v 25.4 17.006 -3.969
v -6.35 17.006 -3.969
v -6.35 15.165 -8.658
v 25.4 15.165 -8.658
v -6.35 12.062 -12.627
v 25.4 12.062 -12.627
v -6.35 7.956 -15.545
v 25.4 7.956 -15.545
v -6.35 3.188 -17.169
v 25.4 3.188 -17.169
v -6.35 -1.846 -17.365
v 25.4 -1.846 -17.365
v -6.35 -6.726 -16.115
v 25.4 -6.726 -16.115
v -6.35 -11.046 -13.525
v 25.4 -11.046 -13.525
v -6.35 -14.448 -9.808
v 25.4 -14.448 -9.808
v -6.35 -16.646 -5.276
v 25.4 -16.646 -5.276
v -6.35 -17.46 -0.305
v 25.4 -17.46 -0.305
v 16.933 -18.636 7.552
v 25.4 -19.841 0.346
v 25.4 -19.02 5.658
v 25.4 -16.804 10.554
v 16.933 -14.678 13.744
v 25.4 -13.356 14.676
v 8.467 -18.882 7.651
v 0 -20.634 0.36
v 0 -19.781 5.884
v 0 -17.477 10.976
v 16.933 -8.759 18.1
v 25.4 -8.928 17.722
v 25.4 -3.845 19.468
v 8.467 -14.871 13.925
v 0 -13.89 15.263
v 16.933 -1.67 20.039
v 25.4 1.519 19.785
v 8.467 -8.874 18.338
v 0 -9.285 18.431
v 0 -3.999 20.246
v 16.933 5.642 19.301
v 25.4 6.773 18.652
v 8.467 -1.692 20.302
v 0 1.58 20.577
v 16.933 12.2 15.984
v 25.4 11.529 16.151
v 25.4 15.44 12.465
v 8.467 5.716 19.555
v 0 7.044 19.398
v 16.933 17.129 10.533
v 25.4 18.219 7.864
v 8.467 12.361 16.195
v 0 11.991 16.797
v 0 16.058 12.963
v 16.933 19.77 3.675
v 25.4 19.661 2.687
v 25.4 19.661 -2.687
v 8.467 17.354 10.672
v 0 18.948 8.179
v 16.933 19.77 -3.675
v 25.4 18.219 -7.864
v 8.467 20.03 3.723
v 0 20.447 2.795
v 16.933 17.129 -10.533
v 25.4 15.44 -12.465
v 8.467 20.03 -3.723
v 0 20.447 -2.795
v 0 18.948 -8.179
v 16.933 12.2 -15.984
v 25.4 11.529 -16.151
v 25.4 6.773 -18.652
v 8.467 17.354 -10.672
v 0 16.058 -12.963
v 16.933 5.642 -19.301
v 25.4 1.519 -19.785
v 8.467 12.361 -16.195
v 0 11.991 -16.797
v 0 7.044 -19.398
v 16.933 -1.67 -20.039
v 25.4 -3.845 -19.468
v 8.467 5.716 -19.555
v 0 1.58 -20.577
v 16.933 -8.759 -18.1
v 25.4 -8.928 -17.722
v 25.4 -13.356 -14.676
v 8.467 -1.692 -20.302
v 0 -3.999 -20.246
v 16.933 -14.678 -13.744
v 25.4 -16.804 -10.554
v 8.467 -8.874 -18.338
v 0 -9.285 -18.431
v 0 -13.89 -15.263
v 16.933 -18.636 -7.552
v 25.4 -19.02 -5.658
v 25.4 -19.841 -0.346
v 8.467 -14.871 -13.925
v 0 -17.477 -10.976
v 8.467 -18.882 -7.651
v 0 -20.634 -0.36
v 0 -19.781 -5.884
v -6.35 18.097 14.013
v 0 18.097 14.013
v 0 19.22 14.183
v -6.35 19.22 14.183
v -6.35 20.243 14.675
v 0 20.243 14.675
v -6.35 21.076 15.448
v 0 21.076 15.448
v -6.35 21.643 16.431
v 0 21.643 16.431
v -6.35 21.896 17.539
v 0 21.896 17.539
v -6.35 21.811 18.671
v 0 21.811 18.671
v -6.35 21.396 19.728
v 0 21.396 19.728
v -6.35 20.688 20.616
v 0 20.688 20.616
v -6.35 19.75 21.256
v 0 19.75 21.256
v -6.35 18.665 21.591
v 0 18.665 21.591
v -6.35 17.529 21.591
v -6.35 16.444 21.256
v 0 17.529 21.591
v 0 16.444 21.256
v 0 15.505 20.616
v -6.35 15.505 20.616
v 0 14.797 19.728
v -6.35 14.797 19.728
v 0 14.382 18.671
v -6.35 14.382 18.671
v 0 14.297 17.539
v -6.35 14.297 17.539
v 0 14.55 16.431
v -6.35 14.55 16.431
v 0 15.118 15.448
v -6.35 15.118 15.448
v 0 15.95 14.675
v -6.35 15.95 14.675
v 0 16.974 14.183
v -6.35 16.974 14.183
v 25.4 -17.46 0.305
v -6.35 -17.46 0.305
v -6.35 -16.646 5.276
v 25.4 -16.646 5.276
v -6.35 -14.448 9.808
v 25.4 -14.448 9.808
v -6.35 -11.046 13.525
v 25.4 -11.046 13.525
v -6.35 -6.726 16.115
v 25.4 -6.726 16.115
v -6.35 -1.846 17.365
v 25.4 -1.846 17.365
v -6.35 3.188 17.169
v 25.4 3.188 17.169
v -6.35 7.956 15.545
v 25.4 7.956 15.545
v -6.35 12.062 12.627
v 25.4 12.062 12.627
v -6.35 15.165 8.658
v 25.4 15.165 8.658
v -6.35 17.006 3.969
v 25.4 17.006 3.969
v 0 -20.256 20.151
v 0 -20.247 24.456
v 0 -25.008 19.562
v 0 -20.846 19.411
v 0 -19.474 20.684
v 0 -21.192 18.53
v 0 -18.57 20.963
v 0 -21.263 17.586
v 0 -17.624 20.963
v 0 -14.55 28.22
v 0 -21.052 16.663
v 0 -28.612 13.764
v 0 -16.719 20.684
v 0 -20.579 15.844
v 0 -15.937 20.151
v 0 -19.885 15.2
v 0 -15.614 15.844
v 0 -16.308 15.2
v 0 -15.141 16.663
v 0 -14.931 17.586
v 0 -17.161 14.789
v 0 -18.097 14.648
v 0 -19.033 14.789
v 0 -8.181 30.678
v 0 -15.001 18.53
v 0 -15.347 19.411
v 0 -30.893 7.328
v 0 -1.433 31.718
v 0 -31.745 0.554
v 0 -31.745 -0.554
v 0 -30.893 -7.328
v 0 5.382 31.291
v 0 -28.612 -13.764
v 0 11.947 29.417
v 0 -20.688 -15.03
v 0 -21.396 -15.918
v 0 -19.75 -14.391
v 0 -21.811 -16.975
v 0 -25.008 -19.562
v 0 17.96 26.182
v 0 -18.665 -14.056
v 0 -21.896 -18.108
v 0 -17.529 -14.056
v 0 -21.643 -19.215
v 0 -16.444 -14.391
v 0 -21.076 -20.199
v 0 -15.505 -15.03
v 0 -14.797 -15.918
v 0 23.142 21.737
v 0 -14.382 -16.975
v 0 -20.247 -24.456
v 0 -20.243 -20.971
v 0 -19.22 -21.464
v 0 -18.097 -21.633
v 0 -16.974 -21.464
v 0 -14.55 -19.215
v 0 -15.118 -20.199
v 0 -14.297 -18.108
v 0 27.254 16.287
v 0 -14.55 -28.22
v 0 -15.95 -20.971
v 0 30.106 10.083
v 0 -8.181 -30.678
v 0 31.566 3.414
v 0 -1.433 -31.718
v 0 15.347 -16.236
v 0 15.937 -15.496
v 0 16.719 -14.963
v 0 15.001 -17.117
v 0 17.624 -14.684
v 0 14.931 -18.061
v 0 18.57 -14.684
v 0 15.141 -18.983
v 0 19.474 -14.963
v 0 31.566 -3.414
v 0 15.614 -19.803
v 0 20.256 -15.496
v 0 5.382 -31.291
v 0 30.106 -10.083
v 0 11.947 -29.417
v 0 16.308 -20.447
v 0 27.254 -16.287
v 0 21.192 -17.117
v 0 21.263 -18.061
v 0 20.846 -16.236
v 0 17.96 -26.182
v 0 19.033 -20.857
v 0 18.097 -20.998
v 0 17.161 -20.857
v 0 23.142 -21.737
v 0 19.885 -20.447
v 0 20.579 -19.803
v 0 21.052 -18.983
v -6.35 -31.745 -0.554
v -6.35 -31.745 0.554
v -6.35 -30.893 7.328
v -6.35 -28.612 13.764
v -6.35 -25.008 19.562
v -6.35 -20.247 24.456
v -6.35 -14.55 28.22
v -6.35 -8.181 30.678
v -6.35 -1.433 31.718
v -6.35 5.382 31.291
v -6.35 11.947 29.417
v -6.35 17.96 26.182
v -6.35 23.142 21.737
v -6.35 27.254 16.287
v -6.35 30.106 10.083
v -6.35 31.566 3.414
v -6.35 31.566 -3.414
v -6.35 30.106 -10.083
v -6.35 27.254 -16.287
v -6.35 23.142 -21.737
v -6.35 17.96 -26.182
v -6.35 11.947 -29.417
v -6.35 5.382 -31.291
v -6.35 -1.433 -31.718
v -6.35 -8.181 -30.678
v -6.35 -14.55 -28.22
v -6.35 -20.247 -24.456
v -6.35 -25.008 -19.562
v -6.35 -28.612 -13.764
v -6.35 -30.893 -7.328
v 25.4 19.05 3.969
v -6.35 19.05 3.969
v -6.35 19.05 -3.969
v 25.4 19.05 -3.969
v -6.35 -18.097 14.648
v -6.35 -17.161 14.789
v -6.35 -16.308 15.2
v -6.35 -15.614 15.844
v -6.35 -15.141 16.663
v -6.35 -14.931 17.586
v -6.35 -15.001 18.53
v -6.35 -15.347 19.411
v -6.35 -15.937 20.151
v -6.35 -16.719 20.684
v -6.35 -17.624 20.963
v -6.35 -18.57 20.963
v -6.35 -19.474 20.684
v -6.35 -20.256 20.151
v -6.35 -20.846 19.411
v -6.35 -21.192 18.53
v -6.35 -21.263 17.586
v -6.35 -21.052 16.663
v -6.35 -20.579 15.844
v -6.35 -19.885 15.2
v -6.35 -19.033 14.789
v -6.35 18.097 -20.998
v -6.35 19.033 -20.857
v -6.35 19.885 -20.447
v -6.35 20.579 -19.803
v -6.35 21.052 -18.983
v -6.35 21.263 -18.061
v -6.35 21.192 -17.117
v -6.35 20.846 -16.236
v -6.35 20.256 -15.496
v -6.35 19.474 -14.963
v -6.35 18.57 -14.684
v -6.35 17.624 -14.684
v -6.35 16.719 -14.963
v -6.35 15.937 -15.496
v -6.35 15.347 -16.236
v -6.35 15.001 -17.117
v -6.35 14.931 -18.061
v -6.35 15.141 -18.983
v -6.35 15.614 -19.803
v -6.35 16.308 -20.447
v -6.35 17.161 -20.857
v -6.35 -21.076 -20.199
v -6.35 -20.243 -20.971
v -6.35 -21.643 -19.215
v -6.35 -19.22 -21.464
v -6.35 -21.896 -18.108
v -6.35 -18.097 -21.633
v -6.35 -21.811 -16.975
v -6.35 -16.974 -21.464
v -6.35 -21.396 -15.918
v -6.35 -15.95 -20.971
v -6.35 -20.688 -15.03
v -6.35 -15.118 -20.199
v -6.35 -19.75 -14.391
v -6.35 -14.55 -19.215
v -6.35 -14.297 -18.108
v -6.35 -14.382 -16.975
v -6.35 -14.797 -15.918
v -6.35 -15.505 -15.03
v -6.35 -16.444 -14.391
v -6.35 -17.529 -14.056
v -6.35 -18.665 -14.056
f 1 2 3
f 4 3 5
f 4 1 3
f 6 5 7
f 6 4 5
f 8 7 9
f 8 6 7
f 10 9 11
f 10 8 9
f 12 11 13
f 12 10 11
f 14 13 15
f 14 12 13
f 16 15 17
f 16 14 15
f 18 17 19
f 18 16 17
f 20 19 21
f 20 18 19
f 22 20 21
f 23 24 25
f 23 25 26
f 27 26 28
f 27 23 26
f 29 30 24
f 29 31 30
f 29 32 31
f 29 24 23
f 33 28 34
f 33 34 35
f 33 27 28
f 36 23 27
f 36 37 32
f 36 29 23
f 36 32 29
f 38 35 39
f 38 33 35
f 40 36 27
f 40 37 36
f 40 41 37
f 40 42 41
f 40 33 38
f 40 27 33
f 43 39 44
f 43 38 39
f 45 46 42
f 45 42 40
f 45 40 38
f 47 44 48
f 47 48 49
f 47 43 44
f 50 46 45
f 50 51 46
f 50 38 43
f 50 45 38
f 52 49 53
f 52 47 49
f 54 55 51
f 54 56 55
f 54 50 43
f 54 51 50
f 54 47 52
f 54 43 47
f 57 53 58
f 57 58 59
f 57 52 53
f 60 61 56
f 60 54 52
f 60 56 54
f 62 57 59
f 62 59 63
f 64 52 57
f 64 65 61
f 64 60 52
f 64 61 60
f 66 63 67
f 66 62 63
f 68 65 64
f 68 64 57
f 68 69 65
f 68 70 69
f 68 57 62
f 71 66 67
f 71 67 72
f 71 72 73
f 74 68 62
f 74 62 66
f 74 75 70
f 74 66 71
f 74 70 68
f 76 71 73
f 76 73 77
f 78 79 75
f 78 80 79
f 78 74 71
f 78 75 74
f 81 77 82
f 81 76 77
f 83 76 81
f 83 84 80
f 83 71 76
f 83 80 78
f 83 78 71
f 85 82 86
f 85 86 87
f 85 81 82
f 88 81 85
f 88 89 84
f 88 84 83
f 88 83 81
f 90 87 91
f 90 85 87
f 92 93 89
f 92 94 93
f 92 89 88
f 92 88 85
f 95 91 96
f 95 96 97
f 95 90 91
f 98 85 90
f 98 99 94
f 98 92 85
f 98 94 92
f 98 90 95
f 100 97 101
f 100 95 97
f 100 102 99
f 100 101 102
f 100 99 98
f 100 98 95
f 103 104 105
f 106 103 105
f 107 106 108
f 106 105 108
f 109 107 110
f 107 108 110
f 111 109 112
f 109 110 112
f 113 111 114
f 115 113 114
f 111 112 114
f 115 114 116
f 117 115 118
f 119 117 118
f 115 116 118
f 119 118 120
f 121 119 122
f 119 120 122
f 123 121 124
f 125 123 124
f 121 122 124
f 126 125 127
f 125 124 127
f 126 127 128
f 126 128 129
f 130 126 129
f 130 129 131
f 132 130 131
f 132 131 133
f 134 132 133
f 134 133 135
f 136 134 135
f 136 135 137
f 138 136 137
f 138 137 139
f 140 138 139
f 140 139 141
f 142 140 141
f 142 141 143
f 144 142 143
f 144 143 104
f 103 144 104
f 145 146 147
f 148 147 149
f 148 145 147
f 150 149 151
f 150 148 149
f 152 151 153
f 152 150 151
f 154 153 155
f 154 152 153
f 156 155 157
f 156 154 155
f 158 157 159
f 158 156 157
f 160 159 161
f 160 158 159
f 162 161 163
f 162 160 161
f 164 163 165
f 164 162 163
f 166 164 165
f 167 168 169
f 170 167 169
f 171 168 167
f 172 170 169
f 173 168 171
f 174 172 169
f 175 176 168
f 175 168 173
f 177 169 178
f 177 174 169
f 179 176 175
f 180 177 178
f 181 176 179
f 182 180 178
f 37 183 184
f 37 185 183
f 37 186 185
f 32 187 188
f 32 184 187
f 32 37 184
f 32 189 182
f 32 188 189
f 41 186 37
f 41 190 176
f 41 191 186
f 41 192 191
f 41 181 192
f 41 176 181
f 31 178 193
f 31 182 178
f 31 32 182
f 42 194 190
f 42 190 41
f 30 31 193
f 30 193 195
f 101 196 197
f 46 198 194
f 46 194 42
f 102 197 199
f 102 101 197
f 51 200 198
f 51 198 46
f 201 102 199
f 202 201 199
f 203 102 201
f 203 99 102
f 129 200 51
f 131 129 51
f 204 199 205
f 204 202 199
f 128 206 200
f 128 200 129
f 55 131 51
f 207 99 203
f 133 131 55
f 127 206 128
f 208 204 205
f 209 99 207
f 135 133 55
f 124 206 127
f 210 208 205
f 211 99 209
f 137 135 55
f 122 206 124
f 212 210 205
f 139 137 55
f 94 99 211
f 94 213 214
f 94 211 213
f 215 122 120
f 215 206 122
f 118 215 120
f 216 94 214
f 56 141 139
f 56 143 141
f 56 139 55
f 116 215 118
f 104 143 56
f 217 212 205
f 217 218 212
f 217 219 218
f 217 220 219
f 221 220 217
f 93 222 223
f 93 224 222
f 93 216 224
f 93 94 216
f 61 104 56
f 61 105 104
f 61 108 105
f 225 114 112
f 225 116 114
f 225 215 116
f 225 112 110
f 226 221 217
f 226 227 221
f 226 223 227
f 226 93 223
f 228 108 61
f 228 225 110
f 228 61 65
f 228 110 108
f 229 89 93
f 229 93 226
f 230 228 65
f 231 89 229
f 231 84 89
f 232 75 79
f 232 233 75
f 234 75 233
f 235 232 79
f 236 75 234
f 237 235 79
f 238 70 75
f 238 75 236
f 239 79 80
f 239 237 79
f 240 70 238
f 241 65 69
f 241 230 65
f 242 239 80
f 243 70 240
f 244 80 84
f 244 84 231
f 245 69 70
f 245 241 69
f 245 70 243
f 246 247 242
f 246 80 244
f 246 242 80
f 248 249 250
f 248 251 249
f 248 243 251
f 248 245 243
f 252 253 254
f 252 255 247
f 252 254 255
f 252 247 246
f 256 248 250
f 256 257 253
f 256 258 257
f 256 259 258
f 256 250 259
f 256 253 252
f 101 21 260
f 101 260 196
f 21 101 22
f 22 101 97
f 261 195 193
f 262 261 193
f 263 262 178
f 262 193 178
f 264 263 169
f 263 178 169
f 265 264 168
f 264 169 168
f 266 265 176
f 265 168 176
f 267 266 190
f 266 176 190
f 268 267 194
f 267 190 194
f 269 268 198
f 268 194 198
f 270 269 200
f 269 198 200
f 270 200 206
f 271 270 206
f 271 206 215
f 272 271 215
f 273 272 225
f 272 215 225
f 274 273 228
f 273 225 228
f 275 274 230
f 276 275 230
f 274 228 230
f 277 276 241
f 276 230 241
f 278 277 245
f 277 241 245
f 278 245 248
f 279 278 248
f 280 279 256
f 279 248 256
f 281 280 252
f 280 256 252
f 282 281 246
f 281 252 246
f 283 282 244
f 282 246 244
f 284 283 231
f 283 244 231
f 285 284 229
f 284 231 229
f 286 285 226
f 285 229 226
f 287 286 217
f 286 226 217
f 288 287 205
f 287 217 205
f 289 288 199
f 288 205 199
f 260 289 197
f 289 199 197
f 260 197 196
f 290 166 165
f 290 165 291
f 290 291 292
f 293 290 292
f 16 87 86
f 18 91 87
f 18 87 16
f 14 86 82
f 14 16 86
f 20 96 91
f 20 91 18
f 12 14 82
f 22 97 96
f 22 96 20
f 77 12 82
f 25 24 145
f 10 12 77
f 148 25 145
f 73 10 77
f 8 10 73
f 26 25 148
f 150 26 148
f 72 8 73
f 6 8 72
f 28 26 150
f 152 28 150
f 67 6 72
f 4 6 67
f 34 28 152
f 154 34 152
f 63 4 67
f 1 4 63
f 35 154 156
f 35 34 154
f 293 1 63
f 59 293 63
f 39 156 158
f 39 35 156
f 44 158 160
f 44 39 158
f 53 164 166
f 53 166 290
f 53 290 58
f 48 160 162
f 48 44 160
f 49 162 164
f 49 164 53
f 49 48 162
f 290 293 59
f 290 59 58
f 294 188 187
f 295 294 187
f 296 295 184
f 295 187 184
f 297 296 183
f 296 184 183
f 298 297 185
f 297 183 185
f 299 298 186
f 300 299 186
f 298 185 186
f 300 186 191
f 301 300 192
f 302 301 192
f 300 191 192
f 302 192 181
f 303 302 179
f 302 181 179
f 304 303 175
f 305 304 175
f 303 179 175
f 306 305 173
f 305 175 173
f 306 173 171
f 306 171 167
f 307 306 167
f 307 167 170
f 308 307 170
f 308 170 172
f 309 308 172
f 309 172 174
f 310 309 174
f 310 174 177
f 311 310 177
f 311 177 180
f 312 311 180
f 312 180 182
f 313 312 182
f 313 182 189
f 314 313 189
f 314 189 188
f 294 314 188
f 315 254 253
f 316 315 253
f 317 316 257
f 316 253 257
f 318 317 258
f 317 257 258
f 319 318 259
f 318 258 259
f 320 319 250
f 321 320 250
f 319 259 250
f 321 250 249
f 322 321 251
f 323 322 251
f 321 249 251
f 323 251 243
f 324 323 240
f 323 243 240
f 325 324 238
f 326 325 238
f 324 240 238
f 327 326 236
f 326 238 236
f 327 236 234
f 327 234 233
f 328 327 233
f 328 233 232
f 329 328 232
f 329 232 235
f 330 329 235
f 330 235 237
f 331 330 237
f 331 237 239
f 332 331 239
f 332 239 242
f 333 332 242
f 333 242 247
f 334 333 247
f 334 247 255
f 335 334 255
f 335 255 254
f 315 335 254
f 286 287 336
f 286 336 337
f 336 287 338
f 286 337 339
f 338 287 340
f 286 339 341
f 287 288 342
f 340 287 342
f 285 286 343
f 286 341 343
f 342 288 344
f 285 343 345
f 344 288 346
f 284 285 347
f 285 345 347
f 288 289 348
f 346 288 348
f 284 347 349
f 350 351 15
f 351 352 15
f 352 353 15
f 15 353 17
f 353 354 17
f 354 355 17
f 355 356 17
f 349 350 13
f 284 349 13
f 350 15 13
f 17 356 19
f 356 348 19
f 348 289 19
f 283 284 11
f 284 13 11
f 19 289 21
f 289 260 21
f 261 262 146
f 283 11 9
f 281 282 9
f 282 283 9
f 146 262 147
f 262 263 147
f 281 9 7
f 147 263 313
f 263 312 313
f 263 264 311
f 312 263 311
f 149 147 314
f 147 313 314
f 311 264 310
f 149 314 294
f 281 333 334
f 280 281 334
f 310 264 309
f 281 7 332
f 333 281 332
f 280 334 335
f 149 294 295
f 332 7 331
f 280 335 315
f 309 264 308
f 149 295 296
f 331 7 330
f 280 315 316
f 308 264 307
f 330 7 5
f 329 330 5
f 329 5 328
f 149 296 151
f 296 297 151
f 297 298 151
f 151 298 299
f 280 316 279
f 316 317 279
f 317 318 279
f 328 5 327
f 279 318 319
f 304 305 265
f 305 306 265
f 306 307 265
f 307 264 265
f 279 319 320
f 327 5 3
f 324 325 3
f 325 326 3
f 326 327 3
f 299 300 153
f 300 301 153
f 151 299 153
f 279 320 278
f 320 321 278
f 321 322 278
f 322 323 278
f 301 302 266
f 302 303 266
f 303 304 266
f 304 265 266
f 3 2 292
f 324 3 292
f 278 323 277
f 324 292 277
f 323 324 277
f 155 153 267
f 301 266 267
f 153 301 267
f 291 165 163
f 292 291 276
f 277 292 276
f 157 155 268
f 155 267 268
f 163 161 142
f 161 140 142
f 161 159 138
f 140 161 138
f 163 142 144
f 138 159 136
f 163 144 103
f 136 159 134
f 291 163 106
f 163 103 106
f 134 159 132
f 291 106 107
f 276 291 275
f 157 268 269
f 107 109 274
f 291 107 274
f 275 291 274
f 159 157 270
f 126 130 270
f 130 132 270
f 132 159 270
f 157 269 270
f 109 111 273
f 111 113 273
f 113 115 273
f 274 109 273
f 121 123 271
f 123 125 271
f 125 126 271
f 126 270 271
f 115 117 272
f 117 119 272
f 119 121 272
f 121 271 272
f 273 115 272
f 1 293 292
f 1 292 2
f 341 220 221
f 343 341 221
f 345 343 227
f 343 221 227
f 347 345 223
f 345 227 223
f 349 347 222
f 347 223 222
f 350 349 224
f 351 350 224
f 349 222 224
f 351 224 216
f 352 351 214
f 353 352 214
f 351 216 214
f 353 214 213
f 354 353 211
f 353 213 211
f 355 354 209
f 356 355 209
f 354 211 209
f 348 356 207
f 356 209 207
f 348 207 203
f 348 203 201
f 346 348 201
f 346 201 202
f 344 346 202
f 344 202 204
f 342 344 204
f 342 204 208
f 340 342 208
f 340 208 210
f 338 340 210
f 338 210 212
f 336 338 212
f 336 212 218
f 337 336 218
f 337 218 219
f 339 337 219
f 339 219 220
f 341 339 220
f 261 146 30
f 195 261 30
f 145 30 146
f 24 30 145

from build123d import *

# Parameters (mm, degrees)
SKETCH1_W                = 31.75
SKETCH1_H                = 14.2875
REVOLVE1_ANGLE           = 358
CUT_EXTRUDE1_DEPTH       = 55.99261314
CUT_EXTRUDE2_START       = -25.4
CUT_EXTRUDE2_DEPTH       = 25.4
DRAFT1_ANGLE             = 1.79
M7_CLEARANCE_HOLE1_D     = 7.62
M7_CLEARANCE_HOLE1_DEPTH = 31.75
HOLE1_D                  = 6.35
HOLE1_DEPTH              = 31.75


with BuildPart() as part:
    # Sketch1 → Revolve1 (revolve)
    with BuildSketch(Plane(origin=(0, 0, 0), x_dir=(1, 0, 0), z_dir=(0, -0.017452406437279848, -0.9998476951563914))):
        with Locations((9.525, 24.60625)):
            Rectangle(SKETCH1_W, SKETCH1_H)
    revolve(axis=Axis((-6.35, 0, 0), (-1, 0, 0)), revolution_arc=REVOLVE1_ANGLE)

    # Sketch2 → Cut-Extrude1 (cut, through all)
    with BuildSketch(Plane.ZY.offset(6.35)):
        with BuildLine():
            Line((3.96875, 17.005526445), (3.96875, 19.05))
            Line((3.96875, 19.05), (-3.96875, 19.05))
            Line((-3.96875, 19.05), (-3.96875, 17.005526445))
            ThreePointArc((-3.96875, 17.005526445), (0, 17.4625), (3.96875, 17.005526445))
        make_face()
    extrude(amount=-CUT_EXTRUDE1_DEPTH, mode=Mode.SUBTRACT)

    # Sketch3 → Cut-Extrude2 (cut)
    with BuildSketch(Plane(origin=(25.4, 0, 0), x_dir=(0, 0, -1), z_dir=(1, 0, 0)).offset(CUT_EXTRUDE2_START)):
        with BuildLine():
            Line((0.360174038, -20.634356809), (0.554113904, -31.745164321))
            ThreePointArc((0.554113904, -31.745164321), (0, 31.75), (-0.554113904, -31.745164321))
            Line((-0.554113904, -31.745164321), (-0.360174038, -20.634356809))
            ThreePointArc((-0.360174038, -20.634356809), (0, 20.6375), (0.360174038, -20.634356809))
        make_face()
    extrude(amount=CUT_EXTRUDE2_DEPTH, mode=Mode.SUBTRACT)

    # Draft1
    draft1_faces = [part.faces().sort_by_distance(p)[0] for p in [
        (12.7, 20.6375, 0),
    ]]
    draft(draft1_faces, Plane(origin=(0, 0, 0), x_dir=(0, 0, 1), z_dir=(1, 0, 0)), DRAFT1_ANGLE)

    # M7 Clearance Hole1
    with Locations(Plane.ZY.offset(6.35)):
        with Locations((-17.823234059, -18.096749091), (17.823234059, 18.096749091)):
            Hole(M7_CLEARANCE_HOLE1_D / 2, depth=M7_CLEARANCE_HOLE1_DEPTH)

    # Hole1
    with Locations(Plane.ZY.offset(6.35)):
        with Locations((-17.823234059, 18.096749091), (17.823234059, -18.096749091)):
            Hole(HOLE1_D / 2, depth=HOLE1_DEPTH)


solid = part.part
